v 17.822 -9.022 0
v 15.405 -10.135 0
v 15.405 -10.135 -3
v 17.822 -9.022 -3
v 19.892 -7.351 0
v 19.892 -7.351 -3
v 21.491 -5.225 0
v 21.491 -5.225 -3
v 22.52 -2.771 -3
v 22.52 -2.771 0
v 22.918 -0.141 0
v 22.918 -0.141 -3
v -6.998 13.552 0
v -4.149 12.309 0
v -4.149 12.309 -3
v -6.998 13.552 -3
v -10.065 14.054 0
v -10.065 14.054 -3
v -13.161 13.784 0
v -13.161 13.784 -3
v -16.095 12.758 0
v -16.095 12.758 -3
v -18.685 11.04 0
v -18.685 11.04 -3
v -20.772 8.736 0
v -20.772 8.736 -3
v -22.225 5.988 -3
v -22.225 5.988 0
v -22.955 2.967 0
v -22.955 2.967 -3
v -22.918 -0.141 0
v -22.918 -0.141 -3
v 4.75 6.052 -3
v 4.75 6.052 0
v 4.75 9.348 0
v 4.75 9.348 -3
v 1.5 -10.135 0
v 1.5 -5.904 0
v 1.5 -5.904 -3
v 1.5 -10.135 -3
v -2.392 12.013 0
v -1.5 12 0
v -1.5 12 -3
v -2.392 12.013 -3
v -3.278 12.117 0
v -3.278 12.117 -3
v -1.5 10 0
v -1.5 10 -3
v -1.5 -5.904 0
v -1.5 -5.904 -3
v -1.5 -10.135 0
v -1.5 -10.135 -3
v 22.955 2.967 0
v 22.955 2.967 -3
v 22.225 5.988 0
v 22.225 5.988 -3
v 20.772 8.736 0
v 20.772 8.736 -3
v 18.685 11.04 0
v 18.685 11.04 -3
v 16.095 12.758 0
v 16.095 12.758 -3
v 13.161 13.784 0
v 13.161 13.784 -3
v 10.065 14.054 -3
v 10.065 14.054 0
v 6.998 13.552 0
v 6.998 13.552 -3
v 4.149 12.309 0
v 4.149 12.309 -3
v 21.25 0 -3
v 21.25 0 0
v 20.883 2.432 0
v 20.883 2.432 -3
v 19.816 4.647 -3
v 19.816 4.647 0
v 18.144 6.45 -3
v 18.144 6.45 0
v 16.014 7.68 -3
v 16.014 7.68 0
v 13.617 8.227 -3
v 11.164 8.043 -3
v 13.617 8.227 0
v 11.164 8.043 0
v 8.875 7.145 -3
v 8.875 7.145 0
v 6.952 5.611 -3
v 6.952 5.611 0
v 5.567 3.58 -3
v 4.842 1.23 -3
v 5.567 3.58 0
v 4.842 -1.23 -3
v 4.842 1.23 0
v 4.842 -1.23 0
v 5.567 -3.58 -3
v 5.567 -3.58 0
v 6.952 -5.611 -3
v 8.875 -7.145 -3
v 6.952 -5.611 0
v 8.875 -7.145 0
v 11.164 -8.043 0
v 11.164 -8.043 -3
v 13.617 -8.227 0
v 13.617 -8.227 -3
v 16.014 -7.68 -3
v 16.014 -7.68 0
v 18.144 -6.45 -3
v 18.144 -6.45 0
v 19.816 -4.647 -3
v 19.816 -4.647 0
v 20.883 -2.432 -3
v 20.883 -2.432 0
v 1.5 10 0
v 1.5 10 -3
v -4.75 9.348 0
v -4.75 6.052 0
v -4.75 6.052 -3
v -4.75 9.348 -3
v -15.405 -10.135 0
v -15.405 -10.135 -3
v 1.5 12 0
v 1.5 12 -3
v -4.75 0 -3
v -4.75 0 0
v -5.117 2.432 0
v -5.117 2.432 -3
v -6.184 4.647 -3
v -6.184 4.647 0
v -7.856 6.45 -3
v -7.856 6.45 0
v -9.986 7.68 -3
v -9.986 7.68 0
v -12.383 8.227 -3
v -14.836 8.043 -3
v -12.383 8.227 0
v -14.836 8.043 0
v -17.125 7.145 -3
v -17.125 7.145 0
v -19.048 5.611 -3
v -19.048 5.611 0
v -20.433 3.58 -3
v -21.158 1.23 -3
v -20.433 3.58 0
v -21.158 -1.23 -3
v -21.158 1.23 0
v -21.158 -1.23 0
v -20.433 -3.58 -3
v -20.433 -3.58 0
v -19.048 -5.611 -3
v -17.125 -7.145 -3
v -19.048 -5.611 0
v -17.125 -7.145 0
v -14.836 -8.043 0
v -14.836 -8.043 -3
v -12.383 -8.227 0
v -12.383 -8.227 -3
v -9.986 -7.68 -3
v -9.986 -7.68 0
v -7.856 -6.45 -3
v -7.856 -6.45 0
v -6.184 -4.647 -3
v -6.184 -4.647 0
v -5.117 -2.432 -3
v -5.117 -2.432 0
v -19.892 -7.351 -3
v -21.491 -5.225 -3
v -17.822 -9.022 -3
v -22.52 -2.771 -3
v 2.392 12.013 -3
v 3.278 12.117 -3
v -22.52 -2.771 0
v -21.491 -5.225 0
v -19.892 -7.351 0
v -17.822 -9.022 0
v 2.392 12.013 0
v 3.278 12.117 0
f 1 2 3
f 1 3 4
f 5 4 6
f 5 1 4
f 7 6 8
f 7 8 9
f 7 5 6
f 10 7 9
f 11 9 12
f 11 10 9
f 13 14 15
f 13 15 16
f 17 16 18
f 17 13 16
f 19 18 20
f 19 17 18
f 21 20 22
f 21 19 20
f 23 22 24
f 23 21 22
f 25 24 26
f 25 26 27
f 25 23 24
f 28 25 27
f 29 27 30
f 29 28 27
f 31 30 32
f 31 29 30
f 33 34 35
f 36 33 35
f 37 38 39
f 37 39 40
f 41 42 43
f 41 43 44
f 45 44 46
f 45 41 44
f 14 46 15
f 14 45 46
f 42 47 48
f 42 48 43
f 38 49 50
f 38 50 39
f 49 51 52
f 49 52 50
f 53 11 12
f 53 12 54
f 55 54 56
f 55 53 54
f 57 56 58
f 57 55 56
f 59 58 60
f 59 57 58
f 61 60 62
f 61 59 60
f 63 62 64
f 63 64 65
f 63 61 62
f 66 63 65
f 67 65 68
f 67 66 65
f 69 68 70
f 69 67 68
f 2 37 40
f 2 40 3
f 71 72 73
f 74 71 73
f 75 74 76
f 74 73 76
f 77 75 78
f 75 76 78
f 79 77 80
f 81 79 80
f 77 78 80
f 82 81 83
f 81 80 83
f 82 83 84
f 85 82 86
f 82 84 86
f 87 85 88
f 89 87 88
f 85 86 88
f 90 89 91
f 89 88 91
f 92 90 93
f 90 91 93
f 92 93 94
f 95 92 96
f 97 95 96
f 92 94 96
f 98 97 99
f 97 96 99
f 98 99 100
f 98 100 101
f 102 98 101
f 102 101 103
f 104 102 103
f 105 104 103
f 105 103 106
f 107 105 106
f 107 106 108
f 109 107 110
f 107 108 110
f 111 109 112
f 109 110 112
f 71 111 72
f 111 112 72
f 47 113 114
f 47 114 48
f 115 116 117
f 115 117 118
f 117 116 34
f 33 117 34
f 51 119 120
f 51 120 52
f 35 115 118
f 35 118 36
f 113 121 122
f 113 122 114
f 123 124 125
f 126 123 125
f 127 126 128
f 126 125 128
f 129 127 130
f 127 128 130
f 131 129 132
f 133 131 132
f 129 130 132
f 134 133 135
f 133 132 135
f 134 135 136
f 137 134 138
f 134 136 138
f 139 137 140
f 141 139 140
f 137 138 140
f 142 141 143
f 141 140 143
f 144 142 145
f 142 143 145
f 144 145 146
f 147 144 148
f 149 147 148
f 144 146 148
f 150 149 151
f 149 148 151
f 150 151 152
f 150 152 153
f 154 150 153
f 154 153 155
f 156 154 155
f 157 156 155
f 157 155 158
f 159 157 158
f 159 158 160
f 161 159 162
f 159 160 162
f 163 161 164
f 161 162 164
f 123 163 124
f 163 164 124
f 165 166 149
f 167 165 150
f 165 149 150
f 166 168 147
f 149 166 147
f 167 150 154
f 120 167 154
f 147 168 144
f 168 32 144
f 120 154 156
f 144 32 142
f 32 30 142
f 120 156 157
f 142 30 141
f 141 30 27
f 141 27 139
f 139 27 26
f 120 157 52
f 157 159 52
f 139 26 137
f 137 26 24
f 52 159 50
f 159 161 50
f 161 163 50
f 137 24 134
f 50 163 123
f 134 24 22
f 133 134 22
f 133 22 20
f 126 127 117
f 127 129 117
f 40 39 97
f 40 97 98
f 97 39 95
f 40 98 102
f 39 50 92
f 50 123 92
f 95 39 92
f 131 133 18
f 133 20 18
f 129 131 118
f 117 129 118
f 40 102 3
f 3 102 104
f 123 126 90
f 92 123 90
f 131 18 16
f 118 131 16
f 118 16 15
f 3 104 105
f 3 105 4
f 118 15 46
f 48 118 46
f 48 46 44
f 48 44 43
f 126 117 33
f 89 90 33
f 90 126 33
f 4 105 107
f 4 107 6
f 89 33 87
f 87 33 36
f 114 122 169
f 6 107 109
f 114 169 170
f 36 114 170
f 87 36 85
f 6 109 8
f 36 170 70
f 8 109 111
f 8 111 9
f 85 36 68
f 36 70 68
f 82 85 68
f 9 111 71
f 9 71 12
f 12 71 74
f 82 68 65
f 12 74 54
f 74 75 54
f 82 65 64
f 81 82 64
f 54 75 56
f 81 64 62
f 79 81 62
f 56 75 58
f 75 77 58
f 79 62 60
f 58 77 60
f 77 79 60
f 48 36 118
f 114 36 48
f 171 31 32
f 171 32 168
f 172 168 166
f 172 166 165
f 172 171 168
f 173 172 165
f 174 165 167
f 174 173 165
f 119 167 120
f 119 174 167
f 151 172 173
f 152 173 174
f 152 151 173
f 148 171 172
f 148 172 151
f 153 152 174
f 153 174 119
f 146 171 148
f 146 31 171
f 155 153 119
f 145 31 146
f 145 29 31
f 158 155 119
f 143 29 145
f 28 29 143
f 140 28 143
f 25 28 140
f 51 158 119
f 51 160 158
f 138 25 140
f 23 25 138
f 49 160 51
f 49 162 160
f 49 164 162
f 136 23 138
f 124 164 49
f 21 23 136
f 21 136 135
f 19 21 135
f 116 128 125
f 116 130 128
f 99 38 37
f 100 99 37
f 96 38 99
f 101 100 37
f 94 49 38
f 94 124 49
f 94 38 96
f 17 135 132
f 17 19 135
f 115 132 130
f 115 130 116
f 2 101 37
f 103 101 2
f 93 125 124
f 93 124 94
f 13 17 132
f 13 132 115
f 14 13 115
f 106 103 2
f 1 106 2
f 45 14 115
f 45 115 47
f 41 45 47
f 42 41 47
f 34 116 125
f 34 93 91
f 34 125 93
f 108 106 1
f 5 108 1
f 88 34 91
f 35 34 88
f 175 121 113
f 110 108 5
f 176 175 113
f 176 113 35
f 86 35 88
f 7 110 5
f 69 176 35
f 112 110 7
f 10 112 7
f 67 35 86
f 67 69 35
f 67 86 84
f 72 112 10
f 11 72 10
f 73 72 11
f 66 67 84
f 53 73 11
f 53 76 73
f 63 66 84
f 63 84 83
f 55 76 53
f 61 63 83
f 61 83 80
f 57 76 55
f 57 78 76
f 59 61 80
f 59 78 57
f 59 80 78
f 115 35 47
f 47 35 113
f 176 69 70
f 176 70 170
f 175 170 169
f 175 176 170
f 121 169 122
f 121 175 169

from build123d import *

# Parameters (mm, degrees)
SKETCH1_R           = 8.25
SKETCH1_W           = 9.5
SKETCH1_H           = 3.296
BOSS_EXTRUDE2_DEPTH = 3


with BuildPart() as part:
    # Sketch1 → Boss-Extrude2 (new body)
    with BuildSketch(Plane.XY):
        with BuildLine():
            Line((1.5, 12), (1.5, 10))
            Line((1.5, 10), (-1.5, 10))
            Line((-1.5, 10), (-1.5, 12))
            ThreePointArc((-1.5, 12), (-2.836268406, 12.053611624), (-4.149, 12.309))
            ThreePointArc((-4.149, 12.309), (-17.444023797, 11.979726259), (-22.91780124, -0.140663152))
            ThreePointArc((-22.91780124, -0.140663152), (-20.757463276, -6.337601174), (-15.405, -10.135))
            Line((-15.405, -10.135), (-1.5, -10.135))
            Line((-1.5, -10.135), (-1.5, -5.904))
            Line((-1.5, -5.904), (1.5, -5.904))
            Line((1.5, -5.904), (1.5, -10.135))
            Line((1.5, -10.135), (15.405, -10.135))
            ThreePointArc((15.405, -10.135), (20.757463276, -6.337601174), (22.91780124, -0.140663152))
            ThreePointArc((22.91780124, -0.140663152), (17.444023797, 11.979726259), (4.149, 12.309))
            ThreePointArc((4.149, 12.309), (2.836268406, 12.053611624), (1.5, 12))
        make_face()
        with Locations((-13, 0)):
            Circle(SKETCH1_R, mode=Mode.SUBTRACT)
        with Locations((13, 0)):
            Circle(SKETCH1_R, mode=Mode.SUBTRACT)
        with Locations((0, 7.7)):
            Rectangle(SKETCH1_W, SKETCH1_H, mode=Mode.SUBTRACT)
    extrude(amount=-BOSS_EXTRUDE2_DEPTH)


solid = part.part
